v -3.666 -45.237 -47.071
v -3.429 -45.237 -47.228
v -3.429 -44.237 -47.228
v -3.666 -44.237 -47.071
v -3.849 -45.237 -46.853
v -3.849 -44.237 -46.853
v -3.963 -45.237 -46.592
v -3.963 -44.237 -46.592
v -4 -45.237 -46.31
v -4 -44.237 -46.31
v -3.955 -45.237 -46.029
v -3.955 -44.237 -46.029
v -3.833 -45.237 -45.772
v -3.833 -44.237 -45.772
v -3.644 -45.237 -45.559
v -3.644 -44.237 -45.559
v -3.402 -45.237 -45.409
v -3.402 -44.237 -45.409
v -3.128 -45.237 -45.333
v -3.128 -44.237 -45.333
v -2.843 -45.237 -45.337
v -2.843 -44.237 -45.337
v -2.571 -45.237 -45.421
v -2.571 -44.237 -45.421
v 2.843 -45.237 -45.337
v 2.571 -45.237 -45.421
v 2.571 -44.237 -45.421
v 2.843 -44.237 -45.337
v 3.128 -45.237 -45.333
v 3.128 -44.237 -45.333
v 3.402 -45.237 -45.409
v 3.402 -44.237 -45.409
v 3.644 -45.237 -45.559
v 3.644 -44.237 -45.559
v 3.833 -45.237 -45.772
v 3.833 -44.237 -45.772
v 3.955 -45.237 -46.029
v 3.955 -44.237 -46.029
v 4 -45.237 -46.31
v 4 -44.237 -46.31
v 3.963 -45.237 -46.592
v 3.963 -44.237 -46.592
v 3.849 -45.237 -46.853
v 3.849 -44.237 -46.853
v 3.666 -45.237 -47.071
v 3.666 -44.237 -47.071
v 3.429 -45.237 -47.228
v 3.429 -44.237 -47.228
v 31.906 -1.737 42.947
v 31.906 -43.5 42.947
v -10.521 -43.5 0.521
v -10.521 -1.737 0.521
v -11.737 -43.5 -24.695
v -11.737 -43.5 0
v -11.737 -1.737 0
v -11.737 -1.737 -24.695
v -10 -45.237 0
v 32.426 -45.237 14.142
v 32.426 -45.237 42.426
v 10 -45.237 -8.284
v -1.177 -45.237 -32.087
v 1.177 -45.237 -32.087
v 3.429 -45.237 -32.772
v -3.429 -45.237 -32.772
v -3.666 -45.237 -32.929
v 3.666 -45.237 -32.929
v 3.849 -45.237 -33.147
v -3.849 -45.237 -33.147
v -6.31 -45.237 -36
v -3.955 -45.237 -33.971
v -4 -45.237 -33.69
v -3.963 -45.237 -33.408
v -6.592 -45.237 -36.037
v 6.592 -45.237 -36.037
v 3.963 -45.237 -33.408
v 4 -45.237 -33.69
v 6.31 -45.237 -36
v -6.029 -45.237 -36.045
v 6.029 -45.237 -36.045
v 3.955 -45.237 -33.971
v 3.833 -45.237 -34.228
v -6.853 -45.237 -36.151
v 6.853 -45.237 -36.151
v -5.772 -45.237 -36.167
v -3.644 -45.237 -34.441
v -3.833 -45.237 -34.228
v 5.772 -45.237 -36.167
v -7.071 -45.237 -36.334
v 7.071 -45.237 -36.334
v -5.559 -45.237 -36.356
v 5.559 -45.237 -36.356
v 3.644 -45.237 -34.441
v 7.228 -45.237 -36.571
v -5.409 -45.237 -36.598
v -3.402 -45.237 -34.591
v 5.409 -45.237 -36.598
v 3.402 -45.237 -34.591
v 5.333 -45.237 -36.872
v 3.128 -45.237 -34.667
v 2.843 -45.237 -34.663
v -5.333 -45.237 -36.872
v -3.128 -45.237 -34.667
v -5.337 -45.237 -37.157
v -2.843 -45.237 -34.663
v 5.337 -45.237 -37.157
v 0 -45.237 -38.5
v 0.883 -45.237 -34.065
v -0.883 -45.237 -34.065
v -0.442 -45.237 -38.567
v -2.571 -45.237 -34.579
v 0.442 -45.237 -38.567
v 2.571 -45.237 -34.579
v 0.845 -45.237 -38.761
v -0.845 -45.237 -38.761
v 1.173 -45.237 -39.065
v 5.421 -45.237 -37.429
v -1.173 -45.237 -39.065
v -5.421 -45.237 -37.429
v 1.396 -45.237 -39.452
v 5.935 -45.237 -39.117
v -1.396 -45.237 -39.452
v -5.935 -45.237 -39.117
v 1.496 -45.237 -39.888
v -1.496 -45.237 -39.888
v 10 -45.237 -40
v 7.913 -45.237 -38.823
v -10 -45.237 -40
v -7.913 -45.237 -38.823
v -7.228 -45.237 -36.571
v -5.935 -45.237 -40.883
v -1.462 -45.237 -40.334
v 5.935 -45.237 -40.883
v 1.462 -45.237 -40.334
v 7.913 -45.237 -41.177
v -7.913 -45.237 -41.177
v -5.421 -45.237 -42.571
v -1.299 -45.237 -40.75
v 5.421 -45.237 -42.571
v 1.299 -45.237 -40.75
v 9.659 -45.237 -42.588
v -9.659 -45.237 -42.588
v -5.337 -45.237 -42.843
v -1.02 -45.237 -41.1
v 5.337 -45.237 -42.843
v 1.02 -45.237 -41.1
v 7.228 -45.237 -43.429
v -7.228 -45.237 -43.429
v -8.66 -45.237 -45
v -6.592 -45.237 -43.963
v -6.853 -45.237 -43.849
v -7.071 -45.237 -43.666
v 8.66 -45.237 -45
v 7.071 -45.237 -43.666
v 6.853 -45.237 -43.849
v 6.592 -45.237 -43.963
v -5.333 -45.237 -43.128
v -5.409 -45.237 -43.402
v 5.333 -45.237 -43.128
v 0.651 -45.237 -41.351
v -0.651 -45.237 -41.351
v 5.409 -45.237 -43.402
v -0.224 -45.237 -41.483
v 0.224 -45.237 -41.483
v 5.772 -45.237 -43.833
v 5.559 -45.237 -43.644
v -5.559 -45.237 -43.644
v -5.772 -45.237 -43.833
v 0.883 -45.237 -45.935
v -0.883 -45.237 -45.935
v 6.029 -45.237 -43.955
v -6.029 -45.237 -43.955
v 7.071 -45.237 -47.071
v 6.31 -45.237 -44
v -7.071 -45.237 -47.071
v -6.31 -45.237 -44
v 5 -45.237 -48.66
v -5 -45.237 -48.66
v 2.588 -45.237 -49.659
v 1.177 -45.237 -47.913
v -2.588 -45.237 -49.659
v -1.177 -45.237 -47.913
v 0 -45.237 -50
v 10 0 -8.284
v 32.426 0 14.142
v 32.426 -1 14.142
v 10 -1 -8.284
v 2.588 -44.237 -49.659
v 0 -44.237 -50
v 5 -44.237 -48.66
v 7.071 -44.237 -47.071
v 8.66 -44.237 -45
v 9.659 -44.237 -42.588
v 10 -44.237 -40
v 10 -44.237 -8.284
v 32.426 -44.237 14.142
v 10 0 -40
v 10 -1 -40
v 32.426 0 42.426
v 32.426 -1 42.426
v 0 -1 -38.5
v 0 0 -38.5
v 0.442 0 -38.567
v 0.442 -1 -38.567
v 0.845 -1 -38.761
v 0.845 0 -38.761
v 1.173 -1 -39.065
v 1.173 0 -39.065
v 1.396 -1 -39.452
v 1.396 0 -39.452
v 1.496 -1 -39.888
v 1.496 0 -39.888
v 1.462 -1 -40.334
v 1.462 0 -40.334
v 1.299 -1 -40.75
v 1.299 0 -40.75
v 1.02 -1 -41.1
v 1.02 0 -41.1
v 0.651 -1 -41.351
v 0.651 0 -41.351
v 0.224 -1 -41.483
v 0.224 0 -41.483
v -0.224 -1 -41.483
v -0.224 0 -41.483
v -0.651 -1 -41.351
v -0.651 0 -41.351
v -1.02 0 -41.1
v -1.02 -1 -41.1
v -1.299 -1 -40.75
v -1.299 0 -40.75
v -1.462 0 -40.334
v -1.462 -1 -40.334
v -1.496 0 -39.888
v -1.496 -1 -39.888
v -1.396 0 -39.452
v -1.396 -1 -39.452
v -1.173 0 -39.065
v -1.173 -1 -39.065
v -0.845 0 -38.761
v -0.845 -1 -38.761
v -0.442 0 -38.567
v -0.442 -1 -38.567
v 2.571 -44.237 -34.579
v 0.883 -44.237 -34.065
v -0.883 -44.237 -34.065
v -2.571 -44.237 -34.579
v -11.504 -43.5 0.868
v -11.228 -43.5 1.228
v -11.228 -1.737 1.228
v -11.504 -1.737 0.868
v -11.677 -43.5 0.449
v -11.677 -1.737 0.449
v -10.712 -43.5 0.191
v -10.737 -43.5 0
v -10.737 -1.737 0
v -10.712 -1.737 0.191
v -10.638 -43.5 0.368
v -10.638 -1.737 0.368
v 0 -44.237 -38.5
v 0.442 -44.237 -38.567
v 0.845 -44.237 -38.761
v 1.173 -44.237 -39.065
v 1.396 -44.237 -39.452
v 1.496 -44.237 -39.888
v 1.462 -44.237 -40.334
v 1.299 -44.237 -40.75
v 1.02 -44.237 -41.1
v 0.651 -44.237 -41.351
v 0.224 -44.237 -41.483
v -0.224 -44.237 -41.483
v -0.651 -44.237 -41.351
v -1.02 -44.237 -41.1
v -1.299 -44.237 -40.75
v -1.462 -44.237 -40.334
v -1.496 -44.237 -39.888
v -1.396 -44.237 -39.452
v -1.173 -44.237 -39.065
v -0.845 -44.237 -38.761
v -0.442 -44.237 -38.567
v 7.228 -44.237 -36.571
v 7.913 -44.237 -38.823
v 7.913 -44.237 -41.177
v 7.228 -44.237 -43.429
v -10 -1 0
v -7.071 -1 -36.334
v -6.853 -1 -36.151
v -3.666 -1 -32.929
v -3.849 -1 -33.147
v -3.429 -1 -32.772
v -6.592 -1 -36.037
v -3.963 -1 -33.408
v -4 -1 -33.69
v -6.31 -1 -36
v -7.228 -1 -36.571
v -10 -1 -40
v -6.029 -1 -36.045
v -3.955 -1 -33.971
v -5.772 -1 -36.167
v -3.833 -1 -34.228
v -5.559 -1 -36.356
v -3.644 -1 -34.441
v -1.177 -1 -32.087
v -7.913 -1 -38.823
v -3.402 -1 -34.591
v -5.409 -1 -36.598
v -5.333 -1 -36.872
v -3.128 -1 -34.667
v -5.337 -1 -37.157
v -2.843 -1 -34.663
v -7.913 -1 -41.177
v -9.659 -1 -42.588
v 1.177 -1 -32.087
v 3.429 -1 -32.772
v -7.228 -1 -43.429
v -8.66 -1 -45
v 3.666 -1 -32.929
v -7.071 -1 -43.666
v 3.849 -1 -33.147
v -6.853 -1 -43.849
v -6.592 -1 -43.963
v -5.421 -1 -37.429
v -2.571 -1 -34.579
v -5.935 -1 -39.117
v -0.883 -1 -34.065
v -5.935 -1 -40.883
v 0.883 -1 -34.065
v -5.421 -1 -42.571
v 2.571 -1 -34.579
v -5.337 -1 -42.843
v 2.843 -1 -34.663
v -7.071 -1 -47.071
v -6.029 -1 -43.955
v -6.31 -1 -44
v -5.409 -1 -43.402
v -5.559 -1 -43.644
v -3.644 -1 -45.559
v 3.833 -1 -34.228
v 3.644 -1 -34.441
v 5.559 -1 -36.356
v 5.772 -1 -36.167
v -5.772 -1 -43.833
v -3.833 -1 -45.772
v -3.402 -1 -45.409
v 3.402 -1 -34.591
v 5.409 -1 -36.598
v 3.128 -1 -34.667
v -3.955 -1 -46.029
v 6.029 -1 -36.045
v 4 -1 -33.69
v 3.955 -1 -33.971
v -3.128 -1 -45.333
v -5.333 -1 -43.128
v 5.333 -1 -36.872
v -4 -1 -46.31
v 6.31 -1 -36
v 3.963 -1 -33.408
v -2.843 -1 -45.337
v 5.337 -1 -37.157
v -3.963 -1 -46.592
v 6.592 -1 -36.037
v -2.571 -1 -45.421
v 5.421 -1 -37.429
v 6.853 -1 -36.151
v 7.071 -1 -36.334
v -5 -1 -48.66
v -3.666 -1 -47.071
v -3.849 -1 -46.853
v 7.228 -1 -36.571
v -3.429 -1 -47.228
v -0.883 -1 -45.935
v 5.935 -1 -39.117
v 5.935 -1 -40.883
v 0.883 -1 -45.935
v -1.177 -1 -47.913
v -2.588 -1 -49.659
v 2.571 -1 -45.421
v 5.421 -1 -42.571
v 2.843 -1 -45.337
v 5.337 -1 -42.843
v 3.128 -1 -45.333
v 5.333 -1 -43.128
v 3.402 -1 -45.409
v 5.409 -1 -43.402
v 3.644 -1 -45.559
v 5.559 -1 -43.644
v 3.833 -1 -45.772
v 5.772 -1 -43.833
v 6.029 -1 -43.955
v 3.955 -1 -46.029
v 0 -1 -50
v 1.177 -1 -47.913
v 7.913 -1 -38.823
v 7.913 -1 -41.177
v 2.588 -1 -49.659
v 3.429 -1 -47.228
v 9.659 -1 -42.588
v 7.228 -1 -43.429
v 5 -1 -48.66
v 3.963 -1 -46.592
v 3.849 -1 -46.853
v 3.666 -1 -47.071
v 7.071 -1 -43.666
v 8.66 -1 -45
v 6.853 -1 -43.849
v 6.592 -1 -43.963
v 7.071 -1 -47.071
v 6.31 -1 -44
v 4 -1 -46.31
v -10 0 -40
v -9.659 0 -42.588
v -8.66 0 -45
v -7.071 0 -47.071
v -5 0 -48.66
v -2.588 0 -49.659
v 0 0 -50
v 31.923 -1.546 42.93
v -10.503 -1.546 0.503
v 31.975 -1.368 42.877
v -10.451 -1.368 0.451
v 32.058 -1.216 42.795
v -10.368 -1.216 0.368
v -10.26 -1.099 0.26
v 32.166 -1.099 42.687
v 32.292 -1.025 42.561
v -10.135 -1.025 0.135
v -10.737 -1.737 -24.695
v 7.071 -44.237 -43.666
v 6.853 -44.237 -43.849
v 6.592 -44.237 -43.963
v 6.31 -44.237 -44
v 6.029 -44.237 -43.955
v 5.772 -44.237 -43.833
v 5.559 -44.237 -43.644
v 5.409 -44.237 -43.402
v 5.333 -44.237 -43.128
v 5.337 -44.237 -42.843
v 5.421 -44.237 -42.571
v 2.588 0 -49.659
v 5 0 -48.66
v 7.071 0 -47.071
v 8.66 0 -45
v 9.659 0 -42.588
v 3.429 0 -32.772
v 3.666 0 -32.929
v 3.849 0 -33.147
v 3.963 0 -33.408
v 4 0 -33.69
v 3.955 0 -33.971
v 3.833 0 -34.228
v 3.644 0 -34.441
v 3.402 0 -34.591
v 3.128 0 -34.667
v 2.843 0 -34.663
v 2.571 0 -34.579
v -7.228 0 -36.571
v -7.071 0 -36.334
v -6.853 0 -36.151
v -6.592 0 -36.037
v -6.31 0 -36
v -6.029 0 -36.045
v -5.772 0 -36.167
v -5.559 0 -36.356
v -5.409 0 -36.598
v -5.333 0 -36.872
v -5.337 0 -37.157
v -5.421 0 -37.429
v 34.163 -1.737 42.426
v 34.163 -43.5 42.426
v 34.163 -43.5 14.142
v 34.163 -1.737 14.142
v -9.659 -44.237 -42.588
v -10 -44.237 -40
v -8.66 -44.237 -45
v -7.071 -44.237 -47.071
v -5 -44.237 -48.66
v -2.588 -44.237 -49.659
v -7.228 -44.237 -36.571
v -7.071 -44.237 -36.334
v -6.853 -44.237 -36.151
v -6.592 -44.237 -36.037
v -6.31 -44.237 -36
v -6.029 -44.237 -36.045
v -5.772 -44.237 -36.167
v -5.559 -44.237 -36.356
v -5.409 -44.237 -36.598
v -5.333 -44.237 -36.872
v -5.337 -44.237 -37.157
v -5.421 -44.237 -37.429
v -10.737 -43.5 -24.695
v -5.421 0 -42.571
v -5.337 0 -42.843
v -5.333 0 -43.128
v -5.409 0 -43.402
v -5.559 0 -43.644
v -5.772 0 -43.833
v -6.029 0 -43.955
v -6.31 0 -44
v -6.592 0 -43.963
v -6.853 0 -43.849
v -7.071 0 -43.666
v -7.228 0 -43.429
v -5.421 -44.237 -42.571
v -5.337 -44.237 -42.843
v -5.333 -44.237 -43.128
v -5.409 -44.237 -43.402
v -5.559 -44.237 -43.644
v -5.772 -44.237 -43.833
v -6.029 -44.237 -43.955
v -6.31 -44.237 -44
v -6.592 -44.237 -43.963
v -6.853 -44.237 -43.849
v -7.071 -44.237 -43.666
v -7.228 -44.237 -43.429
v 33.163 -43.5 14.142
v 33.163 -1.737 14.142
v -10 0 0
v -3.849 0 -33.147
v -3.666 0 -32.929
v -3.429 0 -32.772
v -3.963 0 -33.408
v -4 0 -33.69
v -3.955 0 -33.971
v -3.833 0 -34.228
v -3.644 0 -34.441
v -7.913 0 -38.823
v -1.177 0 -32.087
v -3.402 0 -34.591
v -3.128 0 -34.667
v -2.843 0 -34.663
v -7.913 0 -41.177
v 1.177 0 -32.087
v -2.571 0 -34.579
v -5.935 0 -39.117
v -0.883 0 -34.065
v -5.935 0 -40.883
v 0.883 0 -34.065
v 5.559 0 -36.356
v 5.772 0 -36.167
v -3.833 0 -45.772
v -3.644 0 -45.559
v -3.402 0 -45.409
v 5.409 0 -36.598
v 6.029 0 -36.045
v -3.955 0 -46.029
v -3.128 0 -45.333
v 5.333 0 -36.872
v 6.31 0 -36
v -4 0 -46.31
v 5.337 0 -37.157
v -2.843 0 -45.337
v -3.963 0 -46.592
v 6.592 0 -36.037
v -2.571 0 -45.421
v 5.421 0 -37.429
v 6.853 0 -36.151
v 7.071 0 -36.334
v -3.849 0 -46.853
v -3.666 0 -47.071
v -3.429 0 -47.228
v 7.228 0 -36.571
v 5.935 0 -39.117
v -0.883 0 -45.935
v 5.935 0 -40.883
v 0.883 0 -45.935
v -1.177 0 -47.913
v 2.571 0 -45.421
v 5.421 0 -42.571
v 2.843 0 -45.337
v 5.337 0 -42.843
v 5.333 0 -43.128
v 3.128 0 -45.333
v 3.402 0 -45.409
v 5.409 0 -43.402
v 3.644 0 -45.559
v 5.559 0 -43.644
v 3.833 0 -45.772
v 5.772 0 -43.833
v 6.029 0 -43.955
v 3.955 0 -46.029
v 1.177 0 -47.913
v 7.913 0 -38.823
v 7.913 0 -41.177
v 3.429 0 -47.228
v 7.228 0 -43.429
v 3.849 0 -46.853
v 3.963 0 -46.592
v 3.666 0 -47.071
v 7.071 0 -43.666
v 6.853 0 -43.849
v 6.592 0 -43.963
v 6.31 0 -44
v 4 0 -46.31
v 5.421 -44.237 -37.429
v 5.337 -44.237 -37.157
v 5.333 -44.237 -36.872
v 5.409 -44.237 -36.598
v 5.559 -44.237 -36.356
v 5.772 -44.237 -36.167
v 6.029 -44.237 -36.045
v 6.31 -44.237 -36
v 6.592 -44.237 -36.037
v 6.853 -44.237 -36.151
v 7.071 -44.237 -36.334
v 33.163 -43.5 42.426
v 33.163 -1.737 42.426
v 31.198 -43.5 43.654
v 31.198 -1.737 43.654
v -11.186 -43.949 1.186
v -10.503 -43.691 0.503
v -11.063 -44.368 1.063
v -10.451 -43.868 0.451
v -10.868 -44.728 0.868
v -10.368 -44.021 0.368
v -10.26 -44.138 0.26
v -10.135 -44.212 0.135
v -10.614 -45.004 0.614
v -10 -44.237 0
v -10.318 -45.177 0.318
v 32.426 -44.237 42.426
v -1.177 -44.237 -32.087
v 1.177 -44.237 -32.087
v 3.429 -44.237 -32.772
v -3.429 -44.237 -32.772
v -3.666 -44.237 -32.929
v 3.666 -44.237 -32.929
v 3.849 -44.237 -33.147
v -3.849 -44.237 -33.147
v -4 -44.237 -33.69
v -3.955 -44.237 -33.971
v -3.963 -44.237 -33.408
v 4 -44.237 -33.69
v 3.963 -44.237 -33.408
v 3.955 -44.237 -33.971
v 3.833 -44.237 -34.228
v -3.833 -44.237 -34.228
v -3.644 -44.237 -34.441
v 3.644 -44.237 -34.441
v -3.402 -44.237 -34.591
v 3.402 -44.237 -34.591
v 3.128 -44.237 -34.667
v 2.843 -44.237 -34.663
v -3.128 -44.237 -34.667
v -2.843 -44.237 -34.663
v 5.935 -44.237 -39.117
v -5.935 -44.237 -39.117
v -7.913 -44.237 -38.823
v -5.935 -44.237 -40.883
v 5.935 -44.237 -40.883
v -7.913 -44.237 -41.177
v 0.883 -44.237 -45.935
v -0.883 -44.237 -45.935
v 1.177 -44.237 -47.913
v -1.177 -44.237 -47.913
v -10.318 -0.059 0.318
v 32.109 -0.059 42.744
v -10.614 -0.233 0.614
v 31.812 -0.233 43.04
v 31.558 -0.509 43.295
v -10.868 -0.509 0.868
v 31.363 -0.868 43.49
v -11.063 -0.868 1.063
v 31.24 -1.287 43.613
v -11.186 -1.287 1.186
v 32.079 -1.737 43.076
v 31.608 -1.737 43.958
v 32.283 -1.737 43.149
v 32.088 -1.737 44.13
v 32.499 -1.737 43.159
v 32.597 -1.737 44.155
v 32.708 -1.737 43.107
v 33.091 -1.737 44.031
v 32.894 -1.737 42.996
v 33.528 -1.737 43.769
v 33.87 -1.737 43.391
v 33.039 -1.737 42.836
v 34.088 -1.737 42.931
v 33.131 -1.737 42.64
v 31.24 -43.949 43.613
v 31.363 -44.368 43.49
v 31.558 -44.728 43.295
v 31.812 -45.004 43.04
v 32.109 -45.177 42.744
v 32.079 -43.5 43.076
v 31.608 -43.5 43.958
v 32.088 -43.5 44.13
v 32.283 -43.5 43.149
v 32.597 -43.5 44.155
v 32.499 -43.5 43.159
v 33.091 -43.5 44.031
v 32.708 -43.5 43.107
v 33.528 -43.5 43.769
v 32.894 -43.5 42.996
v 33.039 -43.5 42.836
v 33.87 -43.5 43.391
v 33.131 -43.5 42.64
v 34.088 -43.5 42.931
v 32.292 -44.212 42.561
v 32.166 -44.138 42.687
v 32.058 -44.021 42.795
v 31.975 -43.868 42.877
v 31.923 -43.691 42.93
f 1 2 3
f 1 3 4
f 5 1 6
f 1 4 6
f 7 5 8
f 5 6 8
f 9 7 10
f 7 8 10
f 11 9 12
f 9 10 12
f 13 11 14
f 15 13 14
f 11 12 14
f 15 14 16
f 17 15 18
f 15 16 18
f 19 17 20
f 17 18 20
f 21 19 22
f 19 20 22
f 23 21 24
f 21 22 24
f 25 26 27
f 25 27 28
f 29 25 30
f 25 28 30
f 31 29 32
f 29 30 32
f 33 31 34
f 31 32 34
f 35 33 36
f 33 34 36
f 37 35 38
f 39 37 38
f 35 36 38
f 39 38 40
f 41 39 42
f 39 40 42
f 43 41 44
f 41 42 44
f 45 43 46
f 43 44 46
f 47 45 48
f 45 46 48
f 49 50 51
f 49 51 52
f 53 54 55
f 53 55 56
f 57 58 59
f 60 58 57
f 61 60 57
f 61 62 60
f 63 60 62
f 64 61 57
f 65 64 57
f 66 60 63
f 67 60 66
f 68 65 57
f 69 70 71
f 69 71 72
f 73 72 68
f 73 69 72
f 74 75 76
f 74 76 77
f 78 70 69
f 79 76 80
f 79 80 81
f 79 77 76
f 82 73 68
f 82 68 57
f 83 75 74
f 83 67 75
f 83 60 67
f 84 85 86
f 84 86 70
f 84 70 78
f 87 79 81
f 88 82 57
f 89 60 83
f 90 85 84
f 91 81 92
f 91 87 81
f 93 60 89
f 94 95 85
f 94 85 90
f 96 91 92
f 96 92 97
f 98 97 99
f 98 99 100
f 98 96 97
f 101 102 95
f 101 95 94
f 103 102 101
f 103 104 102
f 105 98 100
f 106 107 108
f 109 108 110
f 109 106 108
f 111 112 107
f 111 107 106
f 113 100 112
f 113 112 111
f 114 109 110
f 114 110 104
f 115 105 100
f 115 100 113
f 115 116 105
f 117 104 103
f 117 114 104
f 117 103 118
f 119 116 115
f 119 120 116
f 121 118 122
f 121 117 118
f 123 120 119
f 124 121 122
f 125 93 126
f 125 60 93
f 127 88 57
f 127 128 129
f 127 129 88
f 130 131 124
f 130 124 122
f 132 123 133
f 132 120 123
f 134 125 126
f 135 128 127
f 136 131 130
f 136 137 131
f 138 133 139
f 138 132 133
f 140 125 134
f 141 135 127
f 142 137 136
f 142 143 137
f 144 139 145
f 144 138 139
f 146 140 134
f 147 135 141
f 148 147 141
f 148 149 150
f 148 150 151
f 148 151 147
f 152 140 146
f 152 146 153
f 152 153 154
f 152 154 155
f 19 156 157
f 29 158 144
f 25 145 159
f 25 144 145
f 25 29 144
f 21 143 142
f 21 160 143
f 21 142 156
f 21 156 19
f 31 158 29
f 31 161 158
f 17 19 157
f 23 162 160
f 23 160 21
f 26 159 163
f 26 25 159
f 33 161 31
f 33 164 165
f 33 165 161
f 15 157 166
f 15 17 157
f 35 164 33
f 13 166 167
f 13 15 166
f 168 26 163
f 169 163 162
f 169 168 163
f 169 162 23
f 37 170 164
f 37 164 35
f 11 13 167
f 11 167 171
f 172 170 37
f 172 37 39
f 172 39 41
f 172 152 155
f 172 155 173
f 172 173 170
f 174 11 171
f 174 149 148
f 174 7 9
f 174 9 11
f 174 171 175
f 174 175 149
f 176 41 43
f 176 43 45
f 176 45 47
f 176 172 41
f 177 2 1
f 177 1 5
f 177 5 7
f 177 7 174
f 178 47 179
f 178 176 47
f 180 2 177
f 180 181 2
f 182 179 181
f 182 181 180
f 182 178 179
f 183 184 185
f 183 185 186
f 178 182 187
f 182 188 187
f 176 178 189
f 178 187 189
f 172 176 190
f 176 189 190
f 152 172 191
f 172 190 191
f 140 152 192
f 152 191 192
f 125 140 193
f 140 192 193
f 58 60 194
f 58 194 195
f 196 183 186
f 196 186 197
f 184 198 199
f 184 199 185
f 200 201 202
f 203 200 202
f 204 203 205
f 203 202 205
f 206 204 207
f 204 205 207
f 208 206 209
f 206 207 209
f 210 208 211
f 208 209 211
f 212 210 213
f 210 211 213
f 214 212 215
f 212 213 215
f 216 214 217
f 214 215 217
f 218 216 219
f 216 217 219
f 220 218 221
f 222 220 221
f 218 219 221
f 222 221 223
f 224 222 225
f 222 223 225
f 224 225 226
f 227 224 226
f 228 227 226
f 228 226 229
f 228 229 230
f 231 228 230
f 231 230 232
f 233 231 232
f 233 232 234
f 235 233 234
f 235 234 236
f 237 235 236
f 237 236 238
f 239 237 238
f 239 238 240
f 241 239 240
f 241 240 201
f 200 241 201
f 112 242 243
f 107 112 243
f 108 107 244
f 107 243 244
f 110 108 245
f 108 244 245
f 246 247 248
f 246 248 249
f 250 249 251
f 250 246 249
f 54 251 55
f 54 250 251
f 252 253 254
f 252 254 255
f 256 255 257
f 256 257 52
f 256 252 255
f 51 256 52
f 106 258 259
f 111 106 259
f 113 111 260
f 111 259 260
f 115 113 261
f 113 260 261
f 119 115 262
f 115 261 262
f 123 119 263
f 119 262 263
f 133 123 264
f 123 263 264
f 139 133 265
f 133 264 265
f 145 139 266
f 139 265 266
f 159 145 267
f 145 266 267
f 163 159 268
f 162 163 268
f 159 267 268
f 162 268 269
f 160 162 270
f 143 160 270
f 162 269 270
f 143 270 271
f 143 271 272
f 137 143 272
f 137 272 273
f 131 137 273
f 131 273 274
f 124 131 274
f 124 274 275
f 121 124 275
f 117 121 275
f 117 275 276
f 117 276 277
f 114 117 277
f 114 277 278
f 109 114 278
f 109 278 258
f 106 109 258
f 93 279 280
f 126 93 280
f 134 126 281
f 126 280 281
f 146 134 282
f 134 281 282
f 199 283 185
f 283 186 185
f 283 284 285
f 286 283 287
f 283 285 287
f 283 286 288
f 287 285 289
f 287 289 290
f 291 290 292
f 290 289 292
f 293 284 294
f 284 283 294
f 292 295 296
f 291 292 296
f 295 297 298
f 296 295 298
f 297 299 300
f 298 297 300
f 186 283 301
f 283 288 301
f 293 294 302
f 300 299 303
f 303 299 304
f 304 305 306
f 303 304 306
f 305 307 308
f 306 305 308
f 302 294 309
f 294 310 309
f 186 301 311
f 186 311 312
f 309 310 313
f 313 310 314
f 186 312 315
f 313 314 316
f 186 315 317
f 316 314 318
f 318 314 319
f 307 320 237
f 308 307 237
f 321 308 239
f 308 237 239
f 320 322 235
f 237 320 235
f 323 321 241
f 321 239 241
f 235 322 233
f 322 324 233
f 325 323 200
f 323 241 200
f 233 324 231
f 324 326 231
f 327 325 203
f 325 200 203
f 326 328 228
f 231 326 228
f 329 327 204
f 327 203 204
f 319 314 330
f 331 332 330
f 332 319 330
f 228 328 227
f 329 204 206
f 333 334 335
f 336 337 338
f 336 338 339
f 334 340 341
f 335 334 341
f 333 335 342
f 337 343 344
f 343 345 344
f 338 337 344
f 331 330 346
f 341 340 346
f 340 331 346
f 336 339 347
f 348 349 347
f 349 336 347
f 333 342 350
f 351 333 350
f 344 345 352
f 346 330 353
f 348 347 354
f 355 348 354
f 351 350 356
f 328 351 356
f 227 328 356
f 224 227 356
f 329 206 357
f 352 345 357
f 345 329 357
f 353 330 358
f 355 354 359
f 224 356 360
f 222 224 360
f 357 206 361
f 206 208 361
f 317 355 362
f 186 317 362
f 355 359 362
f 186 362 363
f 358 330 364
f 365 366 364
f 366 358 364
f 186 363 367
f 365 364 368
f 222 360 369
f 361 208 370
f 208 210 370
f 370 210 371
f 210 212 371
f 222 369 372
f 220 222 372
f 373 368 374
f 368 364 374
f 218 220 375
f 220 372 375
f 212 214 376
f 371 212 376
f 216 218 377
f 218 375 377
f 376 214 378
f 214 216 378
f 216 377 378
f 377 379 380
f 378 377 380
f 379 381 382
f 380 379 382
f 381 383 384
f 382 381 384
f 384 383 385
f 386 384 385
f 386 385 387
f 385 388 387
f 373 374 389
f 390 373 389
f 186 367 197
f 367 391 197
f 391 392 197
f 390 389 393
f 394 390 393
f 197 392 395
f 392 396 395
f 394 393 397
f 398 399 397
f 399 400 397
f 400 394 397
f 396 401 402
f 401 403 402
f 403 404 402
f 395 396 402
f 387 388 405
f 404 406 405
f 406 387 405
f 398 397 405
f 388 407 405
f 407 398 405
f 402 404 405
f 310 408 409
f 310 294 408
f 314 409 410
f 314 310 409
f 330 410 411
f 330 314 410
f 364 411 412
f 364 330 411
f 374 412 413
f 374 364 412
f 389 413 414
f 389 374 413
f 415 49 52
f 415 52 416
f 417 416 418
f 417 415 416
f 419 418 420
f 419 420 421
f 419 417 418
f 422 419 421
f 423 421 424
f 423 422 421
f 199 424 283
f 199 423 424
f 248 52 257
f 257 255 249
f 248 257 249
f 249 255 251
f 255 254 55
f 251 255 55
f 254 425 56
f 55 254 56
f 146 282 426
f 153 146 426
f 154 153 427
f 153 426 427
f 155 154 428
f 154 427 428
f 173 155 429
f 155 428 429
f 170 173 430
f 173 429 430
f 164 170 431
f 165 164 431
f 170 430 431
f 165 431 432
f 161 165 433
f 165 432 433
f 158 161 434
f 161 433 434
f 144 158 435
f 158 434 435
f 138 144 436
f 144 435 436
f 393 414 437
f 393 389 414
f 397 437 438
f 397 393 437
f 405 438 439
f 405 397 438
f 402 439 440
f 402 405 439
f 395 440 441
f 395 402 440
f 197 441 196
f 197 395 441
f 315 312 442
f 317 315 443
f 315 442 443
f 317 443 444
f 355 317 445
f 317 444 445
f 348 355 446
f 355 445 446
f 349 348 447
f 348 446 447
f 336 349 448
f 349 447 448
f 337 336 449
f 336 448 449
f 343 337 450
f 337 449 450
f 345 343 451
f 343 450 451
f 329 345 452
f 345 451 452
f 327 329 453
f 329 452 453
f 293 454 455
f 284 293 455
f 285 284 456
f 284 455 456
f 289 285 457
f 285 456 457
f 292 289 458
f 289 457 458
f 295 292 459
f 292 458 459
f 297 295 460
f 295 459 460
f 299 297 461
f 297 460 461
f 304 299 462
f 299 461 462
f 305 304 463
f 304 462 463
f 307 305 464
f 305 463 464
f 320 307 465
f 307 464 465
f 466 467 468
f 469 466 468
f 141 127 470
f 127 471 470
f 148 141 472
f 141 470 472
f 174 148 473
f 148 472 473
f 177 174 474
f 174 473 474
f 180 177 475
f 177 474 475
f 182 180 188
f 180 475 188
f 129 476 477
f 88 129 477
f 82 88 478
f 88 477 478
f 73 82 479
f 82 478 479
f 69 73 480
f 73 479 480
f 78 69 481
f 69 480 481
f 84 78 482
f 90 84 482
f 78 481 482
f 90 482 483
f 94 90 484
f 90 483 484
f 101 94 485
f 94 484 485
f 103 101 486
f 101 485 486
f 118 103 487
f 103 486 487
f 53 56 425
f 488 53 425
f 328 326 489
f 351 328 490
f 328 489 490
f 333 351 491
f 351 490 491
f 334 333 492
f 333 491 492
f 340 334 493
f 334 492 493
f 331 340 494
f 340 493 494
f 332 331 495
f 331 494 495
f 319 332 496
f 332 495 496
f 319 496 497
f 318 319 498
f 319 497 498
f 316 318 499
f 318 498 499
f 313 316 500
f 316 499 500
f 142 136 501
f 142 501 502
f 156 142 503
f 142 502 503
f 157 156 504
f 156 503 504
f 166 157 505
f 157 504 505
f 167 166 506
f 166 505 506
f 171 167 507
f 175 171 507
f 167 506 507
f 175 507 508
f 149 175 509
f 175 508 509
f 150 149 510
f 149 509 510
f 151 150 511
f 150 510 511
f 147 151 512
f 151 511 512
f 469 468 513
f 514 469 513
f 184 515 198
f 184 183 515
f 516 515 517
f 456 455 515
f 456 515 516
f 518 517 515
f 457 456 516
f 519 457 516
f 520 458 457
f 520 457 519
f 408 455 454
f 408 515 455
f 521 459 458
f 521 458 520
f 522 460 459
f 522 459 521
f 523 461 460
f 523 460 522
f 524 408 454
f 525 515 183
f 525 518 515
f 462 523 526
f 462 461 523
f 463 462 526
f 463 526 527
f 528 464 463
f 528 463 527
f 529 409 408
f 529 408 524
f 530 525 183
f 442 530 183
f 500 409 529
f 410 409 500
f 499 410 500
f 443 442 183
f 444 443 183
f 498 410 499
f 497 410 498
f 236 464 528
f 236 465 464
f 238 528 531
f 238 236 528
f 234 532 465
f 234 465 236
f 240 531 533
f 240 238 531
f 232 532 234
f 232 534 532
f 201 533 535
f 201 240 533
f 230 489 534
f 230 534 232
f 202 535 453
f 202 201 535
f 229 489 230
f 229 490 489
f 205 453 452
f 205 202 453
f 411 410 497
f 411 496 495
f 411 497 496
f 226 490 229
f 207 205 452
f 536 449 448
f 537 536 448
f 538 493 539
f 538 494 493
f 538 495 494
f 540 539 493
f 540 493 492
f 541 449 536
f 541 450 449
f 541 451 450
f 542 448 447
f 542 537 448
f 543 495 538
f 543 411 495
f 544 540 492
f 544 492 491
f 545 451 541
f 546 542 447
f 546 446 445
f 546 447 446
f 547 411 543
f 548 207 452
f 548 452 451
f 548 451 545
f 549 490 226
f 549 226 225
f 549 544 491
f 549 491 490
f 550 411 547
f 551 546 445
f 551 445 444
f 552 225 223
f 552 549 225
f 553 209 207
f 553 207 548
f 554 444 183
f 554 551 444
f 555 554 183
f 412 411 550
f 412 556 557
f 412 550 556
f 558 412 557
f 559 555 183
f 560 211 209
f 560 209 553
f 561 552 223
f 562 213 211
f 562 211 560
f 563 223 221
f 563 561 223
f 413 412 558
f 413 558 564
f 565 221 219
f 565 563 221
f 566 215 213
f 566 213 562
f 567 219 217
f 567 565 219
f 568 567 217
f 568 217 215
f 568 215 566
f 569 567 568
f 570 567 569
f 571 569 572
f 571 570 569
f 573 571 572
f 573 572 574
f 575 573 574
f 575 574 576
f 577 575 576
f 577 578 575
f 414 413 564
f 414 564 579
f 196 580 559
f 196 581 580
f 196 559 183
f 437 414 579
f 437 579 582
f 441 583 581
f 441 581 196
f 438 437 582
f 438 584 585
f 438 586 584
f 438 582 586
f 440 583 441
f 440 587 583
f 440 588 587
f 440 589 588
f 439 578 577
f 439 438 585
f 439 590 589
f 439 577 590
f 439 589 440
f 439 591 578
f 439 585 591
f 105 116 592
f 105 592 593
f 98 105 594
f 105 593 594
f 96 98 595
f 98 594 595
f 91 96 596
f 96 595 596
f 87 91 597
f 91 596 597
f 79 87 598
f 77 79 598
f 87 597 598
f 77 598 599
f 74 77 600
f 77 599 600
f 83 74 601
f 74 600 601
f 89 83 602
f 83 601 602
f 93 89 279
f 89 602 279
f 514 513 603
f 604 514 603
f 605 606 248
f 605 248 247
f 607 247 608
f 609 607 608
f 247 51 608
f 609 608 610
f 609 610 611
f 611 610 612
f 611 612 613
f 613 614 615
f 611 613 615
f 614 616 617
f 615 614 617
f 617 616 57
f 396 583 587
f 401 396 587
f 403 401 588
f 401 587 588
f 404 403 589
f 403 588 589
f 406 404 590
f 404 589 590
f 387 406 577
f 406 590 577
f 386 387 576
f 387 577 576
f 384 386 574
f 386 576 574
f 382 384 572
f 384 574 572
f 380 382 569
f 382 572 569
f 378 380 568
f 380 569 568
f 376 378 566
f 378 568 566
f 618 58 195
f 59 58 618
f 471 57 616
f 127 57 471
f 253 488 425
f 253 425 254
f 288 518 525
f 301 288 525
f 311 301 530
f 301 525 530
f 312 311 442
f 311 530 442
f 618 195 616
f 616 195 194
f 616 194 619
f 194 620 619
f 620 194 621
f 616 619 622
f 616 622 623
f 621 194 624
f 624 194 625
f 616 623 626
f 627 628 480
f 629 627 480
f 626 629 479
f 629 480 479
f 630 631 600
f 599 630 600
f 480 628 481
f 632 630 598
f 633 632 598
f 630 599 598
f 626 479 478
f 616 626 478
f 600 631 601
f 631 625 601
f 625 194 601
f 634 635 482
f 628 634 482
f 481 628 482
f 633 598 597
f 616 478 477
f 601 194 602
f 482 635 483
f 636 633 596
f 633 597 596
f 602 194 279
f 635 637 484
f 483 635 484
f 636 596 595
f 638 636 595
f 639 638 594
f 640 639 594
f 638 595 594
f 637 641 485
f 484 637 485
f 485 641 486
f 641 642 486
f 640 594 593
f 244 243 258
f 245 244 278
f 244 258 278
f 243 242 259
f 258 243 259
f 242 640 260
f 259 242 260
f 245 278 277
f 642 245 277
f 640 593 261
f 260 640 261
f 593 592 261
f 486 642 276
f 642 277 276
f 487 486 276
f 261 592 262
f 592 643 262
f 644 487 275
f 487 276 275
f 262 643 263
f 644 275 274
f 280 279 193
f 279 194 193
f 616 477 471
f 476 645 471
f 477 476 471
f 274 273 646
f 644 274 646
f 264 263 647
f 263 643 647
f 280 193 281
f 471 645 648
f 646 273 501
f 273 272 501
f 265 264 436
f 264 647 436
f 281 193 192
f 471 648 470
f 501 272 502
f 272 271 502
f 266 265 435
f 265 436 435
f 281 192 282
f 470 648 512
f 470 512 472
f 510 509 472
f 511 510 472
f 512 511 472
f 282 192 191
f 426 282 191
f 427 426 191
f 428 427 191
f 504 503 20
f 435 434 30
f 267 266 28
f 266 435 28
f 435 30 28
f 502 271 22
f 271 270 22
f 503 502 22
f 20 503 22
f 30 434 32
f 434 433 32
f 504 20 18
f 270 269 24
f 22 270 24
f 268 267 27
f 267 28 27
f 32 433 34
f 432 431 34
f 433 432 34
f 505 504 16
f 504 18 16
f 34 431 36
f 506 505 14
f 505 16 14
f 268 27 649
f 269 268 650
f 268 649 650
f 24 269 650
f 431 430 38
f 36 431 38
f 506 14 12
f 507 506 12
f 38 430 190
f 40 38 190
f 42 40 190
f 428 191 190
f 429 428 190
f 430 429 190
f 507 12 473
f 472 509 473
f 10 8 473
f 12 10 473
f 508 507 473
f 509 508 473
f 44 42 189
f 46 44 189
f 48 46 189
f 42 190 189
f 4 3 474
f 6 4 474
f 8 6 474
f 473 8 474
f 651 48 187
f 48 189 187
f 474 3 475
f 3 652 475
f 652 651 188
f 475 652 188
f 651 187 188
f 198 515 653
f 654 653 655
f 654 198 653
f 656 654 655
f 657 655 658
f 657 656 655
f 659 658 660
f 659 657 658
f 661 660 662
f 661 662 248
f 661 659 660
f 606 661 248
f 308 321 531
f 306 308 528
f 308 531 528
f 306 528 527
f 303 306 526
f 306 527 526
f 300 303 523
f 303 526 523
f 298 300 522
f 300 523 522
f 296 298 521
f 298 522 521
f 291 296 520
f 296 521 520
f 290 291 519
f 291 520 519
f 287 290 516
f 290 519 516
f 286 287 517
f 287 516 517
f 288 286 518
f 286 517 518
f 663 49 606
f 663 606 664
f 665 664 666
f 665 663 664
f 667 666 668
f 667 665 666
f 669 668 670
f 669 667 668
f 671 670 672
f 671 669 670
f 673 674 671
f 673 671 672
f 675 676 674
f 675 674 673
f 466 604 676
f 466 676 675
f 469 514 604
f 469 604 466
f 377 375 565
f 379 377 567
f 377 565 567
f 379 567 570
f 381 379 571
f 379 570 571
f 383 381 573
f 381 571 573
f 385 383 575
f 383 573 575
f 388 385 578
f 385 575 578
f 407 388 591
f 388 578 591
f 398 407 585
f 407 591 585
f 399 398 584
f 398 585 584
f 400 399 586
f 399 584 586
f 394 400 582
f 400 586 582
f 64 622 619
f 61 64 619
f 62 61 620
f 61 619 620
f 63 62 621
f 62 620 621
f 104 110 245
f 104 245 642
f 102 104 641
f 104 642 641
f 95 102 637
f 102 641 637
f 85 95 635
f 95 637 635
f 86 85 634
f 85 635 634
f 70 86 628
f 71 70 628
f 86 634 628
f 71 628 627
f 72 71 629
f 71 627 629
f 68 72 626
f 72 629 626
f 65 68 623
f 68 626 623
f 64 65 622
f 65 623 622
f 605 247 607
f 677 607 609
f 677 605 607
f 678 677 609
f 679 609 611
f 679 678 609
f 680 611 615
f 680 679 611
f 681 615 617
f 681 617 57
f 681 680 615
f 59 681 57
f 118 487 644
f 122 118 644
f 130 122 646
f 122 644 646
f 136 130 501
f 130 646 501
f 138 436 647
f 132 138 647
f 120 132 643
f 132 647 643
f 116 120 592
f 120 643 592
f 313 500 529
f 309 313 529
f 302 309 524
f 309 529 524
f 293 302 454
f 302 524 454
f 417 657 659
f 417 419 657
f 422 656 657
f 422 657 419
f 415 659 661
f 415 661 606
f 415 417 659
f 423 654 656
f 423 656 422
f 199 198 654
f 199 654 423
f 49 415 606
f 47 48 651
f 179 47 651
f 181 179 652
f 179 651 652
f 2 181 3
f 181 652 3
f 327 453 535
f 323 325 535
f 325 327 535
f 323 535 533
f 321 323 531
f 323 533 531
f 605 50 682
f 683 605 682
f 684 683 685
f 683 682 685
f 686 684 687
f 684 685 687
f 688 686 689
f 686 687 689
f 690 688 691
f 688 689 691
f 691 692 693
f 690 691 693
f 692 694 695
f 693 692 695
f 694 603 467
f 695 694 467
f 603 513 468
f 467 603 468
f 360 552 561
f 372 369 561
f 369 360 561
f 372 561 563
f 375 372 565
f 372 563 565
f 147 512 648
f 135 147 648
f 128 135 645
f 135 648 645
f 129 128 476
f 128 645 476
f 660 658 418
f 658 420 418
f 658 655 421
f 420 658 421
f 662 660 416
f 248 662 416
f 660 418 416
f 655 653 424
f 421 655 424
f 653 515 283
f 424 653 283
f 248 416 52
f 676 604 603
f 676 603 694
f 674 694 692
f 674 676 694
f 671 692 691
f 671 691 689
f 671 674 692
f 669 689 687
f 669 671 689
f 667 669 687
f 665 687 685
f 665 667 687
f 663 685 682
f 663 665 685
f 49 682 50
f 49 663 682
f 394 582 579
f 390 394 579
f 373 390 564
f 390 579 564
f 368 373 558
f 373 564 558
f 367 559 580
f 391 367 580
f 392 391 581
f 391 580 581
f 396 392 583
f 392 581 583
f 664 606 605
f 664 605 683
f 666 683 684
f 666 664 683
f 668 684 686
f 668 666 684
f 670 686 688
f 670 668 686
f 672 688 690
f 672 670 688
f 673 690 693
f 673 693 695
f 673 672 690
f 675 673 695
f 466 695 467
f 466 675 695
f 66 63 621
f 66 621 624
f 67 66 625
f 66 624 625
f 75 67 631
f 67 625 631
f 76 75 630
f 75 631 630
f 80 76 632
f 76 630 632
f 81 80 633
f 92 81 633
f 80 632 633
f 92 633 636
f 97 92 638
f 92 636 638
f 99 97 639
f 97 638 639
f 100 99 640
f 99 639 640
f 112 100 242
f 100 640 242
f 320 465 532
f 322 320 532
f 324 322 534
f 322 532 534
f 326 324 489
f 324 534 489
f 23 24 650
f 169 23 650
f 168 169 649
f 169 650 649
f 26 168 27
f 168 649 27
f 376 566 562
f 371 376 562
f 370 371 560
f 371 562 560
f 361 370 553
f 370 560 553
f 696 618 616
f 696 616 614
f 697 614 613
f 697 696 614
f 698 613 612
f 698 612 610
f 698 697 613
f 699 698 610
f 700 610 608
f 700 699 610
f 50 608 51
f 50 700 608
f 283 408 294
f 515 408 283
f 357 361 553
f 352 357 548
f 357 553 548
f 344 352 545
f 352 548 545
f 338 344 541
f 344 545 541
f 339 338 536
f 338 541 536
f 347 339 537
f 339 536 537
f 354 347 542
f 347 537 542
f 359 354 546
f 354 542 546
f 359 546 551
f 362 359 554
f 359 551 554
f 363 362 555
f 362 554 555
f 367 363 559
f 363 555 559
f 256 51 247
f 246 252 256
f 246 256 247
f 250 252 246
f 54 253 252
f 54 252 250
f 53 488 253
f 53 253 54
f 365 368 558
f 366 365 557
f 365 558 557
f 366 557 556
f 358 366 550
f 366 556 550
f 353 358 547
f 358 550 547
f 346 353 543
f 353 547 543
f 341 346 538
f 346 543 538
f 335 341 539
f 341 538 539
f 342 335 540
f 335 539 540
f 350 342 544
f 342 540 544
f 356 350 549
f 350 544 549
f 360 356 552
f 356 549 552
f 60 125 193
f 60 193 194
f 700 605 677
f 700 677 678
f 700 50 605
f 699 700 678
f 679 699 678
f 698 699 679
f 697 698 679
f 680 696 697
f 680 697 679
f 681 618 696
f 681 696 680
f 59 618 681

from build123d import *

# Parameters (mm, degrees)
SM_BASE_FLANGE_1_DEPTH      = 1
SM_EDGE_FLANGE_1_DEPTH      = 60
SM_EDGE_FLANGE_2_DEPTH      = 60
SM_START                    = 1
SM_EDGE_FLANGE_2_FLAT_DEPTH = 1
SKETCH_16_R                 = 1.5
CUT_EXTRUDE_1_DEPTH         = 75.818592891
FILLET_1_R                  = 10
SM_EDGE_FLANGE_4_DEPTH      = 41.7634
SM_EDGE_FLANGE_5_DEPTH      = 41.7634


# Sheet-metal steps are written as plain solids
with BuildPart() as part:
    # Sketch 1 → 基材-凸緣1 (new body)
    with BuildSketch(Plane(origin=(0, 0, 0), x_dir=(1, 0, 0), z_dir=(0, 1, 0))):
        Polygon((-10, 0), (32.426406871, -42.426406871), (32.426406871, -14.142135624), (10, 8.284271247), (10, 50), (-10, 50), align=None)
    extrude(amount=-SM_BASE_FLANGE_1_DEPTH)

    # 邊線-凸緣1 section (across the edge) → 邊線-凸緣1 (add)
    with BuildSketch(Plane(origin=(31.905552016, -1, 42.947261726), x_dir=(0.7071067811865475, -3.4914813388431334e-15, -0.7071067811865476), z_dir=(-0.7071067811865476, 0, -0.7071067811865475))):
        with BuildLine():
            Line((-1, 0.7366), (-1, 42.5))
            Line((-1, 42.5), (0, 42.5))
            Line((0, 42.5), (0, 0.7366))
            ThreePointArc((0, 0.7366), (0.215745145, 0.215745145), (0.7366, 0))
            Line((0.7366, 0), (0.7366, -1))
            ThreePointArc((0.7366, -1), (-0.491361636, -0.491361636), (-1, 0.7366))
        make_face()
    extrude(amount=SM_EDGE_FLANGE_1_DEPTH)

    # 邊線-凸緣2 bend section (across the edge) → 邊線-凸緣2 (add)
    with BuildSketch(Plane(origin=(31.905552016, -44.2366, 42.947261726), x_dir=(0, 1, 0), z_dir=(-0.7071067811865477, 0, -0.7071067811865475))):
        with BuildLine():
            Line((-1, 0.7366), (0, 0.7366))
            ThreePointArc((0, 0.7366), (0.215745145, 0.215745145), (0.7366, 0))
            Line((0.7366, 0), (0.7366, -1))
            ThreePointArc((0.7366, -1), (-0.491361636, -0.491361636), (-1, 0.7366))
        make_face()
    extrude(amount=SM_EDGE_FLANGE_2_DEPTH)

    # 邊線-凸緣2 profile (on flange) → 邊線-凸緣2 flat (add)
    with BuildSketch(Plane(origin=(-5.520854855, -44.2366, 5.520854855), x_dir=(-0.7071067811865477, 0, -0.7071067811865475), z_dir=(0, -1, 0)).offset(SM_START)):
        Polygon((7.071067812, 0.7366), (42.426406871, 36.091939059), (28.284271247, 50.234074683), (-1.213203436, 20.7366), (-32.928932188, 20.7366), (-52.928932188, 0.7366), align=None)
    extrude(amount=-SM_EDGE_FLANGE_2_FLAT_DEPTH)

    # 草圖16 → 除料-伸長1 (cut, through all)
    with BuildSketch(Plane(origin=(0, 0, 0), x_dir=(1, 0, 0), z_dir=(0, 1, 0))):
        with Locations(Location((0, 40, 0), (0, 0, 270))):
            Circle(SKETCH_16_R)
        with BuildLine():
            ThreePointArc((3.428571429, 47.228063223), (0, 48), (-3.428571429, 47.228063223))
            ThreePointArc((-3.428571429, 47.228063223), (-3.903507903, 45.895983892), (-2.571428571, 45.421047417))
            ThreePointArc((-2.571428571, 45.421047417), (0, 46), (2.571428571, 45.421047417))
            ThreePointArc((2.571428571, 45.421047417), (3.903507903, 45.895983892), (3.428571429, 47.228063223))
        make_face()
        with BuildLine():
            ThreePointArc((7.228063223, 36.571428571), (8, 40), (7.228063223, 43.428571429))
            ThreePointArc((7.228063223, 43.428571429), (5.895983892, 43.903507903), (5.421047417, 42.571428571))
            ThreePointArc((5.421047417, 42.571428571), (6, 40), (5.421047417, 37.428571429))
            ThreePointArc((5.421047417, 37.428571429), (5.895983892, 36.096492097), (7.228063223, 36.571428571))
        make_face()
        with BuildLine():
            ThreePointArc((-3.428571429, 32.771936777), (0, 32), (3.428571429, 32.771936777))
            ThreePointArc((3.428571429, 32.771936777), (3.903507903, 34.104016108), (2.571428571, 34.578952583))
            ThreePointArc((2.571428571, 34.578952583), (0, 34), (-2.571428571, 34.578952583))
            ThreePointArc((-2.571428571, 34.578952583), (-3.903507903, 34.104016108), (-3.428571429, 32.771936777))
        make_face()
        with BuildLine():
            ThreePointArc((-7.228063223, 43.428571429), (-8, 40), (-7.228063223, 36.571428571))
            ThreePointArc((-7.228063223, 36.571428571), (-5.895983892, 36.096492097), (-5.421047417, 37.428571429))
            ThreePointArc((-5.421047417, 37.428571429), (-6, 40), (-5.421047417, 42.571428571))
            ThreePointArc((-5.421047417, 42.571428571), (-5.895983892, 43.903507903), (-7.228063223, 43.428571429))
        make_face()
    extrude(amount=-CUT_EXTRUDE_1_DEPTH, mode=Mode.SUBTRACT)

    # 圓角1
    fillet_1_edges = [part.edges().sort_by_distance(p)[0] for p in [
        (-10, -0.5, -50),
        (10, -0.5, -50),
        (-10, -44.7366, -50),
        (10, -44.7366, -50),
    ]]
    fillet(fillet_1_edges, radius=FILLET_1_R - 0.0001)  # a hair under: the kernel refuses the full size

    # 邊線-凸緣4 section (across the edge) → 邊線-凸緣4 (add)
    with BuildSketch(Plane(origin=(33.163006871, -1.7366, 44.204716581), x_dir=(-1, 0, 0), z_dir=(0, -1, 0))):
        with BuildLine():
            Line((-1, 1.77830971), (-1, 30.062580958))
            Line((-1, 30.062580958), (0, 30.062580958))
            Line((0, 30.062580958), (0, 1.77830971))
            ThreePointArc((0, 1.77830971), (0.454715384, 1.097780046), (1.257454855, 1.257454855))
            Line((1.257454855, 1.257454855), (1.964561636, 0.550348074))
            ThreePointArc((1.964561636, 0.550348074), (0.072031951, 0.173900514), (-1, 1.77830971))
        make_face()
    extrude(amount=SM_EDGE_FLANGE_4_DEPTH)

    # 邊線-凸緣5 section (across the edge) → 邊線-凸緣5 (add)
    with BuildSketch(Plane(origin=(-10.7366, -43.5, 0.30510971), x_dir=(1, 0, 0), z_dir=(0, 1, 0))):
        with BuildLine():
            Line((-1, 0.30510971), (-1, 25))
            Line((-1, 25), (0, 25))
            Line((0, 25), (0, 0.30510971))
            ThreePointArc((0, 0.30510971), (0.056070336, 0.023225094), (0.215745145, -0.215745145))
            Line((0.215745145, -0.215745145), (-0.491361636, -0.922851926))
            ThreePointArc((-0.491361636, -0.922851926), (-0.867809196, -0.359458339), (-1, 0.30510971))
        make_face()
    extrude(amount=SM_EDGE_FLANGE_5_DEPTH)


solid = part.part
